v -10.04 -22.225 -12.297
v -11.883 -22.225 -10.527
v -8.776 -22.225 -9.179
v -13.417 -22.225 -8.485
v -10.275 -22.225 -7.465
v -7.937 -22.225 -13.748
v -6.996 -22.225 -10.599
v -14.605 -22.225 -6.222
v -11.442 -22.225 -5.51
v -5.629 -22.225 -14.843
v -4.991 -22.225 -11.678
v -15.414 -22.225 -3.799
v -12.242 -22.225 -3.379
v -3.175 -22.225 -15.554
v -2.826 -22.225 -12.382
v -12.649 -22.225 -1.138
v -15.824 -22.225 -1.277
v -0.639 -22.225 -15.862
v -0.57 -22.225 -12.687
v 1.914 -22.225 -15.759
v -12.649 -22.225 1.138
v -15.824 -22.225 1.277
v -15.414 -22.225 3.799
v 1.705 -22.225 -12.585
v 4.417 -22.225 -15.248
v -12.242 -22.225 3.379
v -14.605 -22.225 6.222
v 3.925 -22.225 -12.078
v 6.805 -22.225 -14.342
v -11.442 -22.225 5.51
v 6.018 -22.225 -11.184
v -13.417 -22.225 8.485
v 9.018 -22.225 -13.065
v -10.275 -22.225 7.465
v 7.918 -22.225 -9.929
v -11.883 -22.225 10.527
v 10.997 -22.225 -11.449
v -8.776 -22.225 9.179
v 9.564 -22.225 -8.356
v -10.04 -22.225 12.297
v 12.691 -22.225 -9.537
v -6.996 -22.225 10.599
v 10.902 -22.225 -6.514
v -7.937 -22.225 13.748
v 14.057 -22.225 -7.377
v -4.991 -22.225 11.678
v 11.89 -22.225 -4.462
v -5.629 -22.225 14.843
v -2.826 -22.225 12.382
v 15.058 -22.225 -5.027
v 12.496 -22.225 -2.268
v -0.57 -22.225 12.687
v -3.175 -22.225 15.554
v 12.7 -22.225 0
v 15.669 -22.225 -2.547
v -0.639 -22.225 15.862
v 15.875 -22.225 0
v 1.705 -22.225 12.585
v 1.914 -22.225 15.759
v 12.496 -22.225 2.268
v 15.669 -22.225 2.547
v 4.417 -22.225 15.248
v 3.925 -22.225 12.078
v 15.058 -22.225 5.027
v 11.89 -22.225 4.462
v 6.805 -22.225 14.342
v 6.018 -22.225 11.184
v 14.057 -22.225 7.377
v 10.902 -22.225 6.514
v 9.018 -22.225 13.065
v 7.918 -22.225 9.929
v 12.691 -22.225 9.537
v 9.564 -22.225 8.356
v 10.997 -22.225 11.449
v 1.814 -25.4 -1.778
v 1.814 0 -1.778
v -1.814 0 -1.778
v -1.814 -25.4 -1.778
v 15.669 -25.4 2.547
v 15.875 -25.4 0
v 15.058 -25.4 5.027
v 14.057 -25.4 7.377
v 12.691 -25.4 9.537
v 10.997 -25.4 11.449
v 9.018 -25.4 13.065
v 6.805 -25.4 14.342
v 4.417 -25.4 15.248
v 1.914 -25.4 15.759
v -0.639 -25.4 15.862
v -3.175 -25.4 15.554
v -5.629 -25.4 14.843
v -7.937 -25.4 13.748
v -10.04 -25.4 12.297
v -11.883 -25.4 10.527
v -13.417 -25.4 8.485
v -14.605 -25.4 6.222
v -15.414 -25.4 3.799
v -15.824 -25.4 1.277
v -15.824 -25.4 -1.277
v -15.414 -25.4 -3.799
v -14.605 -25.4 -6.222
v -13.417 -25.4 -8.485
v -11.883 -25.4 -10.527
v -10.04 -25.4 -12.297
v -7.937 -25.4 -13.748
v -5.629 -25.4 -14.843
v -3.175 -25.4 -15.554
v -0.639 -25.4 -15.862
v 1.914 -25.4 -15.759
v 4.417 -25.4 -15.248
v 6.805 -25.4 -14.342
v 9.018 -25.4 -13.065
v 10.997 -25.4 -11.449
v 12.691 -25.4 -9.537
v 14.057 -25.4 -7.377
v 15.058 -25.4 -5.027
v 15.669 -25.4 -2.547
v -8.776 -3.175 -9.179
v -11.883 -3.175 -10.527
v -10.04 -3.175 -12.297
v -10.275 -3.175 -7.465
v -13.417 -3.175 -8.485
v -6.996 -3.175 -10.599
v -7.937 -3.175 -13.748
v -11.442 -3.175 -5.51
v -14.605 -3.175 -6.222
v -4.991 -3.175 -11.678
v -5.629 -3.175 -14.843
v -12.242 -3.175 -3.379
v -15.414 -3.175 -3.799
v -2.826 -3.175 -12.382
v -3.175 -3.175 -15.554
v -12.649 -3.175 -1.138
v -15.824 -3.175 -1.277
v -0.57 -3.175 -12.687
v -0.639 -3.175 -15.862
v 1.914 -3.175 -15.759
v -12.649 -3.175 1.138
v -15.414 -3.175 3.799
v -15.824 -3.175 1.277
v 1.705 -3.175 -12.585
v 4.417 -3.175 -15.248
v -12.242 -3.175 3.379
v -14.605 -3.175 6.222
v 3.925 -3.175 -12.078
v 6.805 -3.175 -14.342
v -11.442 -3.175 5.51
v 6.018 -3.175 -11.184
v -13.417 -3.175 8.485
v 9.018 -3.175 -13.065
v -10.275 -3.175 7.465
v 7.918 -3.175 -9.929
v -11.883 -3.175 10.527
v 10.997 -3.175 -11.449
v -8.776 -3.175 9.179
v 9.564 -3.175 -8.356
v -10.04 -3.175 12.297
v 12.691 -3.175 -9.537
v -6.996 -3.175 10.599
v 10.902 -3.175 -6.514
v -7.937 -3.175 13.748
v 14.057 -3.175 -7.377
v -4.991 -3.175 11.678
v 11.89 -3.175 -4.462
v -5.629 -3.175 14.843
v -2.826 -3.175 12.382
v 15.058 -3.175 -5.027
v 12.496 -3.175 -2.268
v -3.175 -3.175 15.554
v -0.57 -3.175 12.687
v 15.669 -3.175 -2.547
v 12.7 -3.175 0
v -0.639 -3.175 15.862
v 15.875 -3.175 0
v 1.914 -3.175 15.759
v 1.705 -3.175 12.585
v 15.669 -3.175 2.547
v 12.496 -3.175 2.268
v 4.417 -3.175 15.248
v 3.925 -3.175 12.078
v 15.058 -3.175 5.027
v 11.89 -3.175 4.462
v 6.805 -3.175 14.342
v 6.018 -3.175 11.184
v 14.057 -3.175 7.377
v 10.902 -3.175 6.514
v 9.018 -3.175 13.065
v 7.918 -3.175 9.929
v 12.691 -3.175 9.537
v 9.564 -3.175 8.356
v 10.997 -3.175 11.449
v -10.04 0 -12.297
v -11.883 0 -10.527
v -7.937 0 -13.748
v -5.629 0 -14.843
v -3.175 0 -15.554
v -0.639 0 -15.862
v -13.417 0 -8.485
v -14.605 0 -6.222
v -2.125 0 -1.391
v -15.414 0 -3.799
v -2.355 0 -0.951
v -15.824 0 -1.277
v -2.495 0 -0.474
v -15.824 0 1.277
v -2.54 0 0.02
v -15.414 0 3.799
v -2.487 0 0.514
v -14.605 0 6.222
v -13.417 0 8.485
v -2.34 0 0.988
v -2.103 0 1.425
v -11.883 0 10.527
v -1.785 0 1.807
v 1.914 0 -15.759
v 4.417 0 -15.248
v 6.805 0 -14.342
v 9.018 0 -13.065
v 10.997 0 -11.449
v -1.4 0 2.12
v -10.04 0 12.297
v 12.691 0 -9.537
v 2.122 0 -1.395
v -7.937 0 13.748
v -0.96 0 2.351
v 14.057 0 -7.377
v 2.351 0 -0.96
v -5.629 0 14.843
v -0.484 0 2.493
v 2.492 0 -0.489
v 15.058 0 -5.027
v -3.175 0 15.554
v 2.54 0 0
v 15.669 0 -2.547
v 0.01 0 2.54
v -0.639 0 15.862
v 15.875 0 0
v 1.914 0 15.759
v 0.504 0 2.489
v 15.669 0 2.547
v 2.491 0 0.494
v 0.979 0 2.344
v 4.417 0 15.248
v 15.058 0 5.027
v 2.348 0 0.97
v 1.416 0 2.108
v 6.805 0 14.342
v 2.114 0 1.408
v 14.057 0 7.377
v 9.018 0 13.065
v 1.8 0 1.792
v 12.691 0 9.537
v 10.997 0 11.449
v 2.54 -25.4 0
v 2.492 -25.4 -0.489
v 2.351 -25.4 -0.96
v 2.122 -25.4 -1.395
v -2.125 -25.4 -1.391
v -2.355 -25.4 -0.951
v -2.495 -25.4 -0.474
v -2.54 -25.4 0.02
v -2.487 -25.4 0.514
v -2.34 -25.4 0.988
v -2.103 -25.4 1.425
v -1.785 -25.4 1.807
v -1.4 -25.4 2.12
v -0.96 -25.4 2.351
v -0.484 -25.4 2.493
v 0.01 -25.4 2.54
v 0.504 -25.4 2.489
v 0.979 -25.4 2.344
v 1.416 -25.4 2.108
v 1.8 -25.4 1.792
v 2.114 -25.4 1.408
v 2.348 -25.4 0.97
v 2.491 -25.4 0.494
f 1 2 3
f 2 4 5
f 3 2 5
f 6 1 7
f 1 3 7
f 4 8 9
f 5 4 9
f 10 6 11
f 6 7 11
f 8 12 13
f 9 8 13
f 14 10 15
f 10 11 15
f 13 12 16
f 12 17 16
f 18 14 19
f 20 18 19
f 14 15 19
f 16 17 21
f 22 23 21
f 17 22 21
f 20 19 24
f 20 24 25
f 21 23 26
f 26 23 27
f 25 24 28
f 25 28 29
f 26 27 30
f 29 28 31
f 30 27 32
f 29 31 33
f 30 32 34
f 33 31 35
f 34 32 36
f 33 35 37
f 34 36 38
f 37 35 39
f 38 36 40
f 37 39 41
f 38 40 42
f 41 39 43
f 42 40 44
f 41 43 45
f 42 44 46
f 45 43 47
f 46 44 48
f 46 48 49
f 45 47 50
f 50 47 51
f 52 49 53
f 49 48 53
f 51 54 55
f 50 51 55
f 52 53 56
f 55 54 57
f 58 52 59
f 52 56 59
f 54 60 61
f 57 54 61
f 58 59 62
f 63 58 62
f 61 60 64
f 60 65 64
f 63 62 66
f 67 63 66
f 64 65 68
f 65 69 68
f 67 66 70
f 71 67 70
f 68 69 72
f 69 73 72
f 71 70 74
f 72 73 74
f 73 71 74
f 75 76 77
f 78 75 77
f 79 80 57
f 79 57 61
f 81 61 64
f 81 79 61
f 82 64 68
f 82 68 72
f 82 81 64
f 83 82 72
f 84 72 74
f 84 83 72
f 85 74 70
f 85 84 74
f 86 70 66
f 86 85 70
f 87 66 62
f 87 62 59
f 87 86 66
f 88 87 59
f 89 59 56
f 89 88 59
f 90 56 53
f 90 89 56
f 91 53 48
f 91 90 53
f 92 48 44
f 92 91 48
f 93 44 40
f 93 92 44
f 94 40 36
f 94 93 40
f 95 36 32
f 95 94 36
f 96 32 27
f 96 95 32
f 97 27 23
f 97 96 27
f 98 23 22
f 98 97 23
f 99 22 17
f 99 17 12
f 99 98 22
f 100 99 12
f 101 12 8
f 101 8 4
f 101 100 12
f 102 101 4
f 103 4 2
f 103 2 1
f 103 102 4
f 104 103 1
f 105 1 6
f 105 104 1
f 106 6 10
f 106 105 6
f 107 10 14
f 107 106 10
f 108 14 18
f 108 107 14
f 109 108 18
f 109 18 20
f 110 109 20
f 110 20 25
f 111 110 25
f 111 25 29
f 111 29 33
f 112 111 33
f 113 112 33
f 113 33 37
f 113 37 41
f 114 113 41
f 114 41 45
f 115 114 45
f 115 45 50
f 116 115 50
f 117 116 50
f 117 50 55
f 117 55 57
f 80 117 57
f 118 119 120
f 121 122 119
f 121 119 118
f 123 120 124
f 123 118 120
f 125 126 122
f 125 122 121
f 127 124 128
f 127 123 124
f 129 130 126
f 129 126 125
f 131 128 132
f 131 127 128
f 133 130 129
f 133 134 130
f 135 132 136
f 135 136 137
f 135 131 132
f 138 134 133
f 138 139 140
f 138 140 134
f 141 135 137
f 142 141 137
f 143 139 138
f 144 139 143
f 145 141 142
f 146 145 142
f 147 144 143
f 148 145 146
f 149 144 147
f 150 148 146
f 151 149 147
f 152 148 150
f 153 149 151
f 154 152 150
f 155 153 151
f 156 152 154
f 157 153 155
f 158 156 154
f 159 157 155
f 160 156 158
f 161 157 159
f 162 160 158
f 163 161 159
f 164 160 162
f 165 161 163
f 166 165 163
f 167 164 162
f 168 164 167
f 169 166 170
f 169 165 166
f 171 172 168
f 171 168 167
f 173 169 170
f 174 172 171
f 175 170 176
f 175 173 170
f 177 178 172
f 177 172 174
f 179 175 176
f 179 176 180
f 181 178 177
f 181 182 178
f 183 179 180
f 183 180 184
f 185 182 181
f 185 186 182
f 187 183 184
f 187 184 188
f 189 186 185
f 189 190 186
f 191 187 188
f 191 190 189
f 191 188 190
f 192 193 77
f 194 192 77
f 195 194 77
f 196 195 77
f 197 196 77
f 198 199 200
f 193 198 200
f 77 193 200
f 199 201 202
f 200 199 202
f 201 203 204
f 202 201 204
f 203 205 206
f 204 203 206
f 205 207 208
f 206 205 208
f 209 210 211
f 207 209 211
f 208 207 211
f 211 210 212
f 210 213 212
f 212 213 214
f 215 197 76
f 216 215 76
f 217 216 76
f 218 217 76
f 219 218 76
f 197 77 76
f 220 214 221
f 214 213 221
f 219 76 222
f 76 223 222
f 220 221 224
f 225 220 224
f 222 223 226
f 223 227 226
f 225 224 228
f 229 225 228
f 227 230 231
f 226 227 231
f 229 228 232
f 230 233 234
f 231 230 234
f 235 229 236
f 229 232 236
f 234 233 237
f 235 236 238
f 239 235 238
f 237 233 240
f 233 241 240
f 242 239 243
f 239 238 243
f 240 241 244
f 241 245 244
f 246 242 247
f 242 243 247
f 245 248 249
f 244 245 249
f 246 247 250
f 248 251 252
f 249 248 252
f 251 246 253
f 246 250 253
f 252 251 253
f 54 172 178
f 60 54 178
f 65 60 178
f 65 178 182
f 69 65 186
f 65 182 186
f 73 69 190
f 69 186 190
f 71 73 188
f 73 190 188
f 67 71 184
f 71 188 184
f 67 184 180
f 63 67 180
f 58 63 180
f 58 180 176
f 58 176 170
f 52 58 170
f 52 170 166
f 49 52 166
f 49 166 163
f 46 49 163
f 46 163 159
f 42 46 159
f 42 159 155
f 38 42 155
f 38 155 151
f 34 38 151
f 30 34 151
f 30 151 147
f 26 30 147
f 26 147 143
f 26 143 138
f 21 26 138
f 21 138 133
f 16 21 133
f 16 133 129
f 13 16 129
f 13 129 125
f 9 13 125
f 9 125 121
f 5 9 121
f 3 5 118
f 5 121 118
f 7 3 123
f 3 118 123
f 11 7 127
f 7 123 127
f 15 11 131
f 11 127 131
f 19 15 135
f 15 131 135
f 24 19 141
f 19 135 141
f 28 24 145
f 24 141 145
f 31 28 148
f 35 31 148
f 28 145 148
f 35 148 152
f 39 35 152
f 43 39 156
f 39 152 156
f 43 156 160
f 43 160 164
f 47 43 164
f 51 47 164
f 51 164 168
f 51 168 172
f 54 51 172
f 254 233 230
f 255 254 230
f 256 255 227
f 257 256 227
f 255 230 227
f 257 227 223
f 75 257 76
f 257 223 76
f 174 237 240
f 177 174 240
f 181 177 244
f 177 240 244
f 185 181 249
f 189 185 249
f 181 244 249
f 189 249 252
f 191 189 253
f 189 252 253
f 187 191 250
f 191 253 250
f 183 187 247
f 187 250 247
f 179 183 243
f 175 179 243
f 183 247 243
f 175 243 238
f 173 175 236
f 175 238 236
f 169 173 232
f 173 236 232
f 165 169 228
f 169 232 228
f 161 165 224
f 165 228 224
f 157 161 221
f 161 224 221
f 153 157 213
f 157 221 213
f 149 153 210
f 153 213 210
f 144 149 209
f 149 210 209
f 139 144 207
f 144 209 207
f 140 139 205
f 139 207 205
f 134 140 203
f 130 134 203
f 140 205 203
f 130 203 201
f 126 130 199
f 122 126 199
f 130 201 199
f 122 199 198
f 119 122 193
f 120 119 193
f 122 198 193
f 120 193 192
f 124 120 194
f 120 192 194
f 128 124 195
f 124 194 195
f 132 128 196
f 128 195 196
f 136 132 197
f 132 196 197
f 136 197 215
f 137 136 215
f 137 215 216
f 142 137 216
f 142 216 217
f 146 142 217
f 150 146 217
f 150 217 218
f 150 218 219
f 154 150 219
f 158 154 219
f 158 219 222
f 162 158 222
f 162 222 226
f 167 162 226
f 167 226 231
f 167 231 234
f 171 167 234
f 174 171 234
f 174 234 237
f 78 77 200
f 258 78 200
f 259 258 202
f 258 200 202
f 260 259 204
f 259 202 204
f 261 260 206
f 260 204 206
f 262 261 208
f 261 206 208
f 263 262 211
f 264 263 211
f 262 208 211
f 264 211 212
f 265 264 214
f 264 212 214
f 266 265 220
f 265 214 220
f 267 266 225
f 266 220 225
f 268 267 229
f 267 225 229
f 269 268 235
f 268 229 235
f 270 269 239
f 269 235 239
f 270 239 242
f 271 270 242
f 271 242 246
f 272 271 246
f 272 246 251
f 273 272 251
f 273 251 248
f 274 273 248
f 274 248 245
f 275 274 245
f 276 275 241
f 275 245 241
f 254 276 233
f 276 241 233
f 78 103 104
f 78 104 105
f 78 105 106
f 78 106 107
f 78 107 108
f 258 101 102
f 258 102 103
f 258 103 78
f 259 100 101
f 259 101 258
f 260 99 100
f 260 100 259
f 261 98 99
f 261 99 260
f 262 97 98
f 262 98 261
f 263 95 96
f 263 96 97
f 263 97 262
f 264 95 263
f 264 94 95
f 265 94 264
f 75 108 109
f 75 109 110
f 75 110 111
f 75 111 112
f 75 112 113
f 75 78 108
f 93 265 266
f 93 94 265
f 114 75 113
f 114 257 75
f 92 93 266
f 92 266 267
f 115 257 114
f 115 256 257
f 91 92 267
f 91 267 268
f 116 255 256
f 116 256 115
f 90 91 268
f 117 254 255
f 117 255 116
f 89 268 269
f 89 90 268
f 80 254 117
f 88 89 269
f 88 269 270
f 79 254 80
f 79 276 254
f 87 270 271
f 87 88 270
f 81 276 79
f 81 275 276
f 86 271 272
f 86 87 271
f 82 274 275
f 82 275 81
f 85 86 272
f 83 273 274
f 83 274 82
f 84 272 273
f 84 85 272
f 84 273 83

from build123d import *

# Parameters (mm, degrees)
F0_R     = 12.7
F1_DEPTH = 25.4
F2_R     = 15.875
F2_R_2   = 12.7
F3_DEPTH = 3.175


with BuildPart() as f1:
    # F0 (on Front) → F1 (new body)
    with BuildSketch(Plane.XZ):
        Circle(F0_R)
        with BuildLine():
            ThreePointArc((-1.8139228208, -1.778), (-0.9602697629, 2.351485059), (2.54, 0))
            ThreePointArc((2.54, 0), (2.351485059, -0.9602697629), (1.8139228208, -1.778))
            ThreePointArc((1.8139228208, -1.778), (0, -2.54), (-1.8139228208, -1.778))
        make_face(mode=Mode.SUBTRACT)
        with BuildLine():
            Line((1.8139228208, -1.778), (-1.8139228208, -1.778))
            ThreePointArc((-1.8139228208, -1.778), (0, -2.54), (1.8139228208, -1.778))
        make_face()
    extrude(amount=F1_DEPTH)

    # F2 (on face) → F3 (join)
    with BuildSketch(Plane.XZ.offset(25.4)):
        Circle(F2_R)
        Circle(F2_R_2, mode=Mode.SUBTRACT)
    extrude(amount=-F3_DEPTH)

    # F5: F1 across plane


with BuildPart() as f1_1:
    add(f1.part)
    add(f1.part.mirror(Plane(origin=(0, -12.7, -0.0066463366), x_dir=(1, 0, 0), z_dir=(0, 1, 0))))


solid = f1_1.part
